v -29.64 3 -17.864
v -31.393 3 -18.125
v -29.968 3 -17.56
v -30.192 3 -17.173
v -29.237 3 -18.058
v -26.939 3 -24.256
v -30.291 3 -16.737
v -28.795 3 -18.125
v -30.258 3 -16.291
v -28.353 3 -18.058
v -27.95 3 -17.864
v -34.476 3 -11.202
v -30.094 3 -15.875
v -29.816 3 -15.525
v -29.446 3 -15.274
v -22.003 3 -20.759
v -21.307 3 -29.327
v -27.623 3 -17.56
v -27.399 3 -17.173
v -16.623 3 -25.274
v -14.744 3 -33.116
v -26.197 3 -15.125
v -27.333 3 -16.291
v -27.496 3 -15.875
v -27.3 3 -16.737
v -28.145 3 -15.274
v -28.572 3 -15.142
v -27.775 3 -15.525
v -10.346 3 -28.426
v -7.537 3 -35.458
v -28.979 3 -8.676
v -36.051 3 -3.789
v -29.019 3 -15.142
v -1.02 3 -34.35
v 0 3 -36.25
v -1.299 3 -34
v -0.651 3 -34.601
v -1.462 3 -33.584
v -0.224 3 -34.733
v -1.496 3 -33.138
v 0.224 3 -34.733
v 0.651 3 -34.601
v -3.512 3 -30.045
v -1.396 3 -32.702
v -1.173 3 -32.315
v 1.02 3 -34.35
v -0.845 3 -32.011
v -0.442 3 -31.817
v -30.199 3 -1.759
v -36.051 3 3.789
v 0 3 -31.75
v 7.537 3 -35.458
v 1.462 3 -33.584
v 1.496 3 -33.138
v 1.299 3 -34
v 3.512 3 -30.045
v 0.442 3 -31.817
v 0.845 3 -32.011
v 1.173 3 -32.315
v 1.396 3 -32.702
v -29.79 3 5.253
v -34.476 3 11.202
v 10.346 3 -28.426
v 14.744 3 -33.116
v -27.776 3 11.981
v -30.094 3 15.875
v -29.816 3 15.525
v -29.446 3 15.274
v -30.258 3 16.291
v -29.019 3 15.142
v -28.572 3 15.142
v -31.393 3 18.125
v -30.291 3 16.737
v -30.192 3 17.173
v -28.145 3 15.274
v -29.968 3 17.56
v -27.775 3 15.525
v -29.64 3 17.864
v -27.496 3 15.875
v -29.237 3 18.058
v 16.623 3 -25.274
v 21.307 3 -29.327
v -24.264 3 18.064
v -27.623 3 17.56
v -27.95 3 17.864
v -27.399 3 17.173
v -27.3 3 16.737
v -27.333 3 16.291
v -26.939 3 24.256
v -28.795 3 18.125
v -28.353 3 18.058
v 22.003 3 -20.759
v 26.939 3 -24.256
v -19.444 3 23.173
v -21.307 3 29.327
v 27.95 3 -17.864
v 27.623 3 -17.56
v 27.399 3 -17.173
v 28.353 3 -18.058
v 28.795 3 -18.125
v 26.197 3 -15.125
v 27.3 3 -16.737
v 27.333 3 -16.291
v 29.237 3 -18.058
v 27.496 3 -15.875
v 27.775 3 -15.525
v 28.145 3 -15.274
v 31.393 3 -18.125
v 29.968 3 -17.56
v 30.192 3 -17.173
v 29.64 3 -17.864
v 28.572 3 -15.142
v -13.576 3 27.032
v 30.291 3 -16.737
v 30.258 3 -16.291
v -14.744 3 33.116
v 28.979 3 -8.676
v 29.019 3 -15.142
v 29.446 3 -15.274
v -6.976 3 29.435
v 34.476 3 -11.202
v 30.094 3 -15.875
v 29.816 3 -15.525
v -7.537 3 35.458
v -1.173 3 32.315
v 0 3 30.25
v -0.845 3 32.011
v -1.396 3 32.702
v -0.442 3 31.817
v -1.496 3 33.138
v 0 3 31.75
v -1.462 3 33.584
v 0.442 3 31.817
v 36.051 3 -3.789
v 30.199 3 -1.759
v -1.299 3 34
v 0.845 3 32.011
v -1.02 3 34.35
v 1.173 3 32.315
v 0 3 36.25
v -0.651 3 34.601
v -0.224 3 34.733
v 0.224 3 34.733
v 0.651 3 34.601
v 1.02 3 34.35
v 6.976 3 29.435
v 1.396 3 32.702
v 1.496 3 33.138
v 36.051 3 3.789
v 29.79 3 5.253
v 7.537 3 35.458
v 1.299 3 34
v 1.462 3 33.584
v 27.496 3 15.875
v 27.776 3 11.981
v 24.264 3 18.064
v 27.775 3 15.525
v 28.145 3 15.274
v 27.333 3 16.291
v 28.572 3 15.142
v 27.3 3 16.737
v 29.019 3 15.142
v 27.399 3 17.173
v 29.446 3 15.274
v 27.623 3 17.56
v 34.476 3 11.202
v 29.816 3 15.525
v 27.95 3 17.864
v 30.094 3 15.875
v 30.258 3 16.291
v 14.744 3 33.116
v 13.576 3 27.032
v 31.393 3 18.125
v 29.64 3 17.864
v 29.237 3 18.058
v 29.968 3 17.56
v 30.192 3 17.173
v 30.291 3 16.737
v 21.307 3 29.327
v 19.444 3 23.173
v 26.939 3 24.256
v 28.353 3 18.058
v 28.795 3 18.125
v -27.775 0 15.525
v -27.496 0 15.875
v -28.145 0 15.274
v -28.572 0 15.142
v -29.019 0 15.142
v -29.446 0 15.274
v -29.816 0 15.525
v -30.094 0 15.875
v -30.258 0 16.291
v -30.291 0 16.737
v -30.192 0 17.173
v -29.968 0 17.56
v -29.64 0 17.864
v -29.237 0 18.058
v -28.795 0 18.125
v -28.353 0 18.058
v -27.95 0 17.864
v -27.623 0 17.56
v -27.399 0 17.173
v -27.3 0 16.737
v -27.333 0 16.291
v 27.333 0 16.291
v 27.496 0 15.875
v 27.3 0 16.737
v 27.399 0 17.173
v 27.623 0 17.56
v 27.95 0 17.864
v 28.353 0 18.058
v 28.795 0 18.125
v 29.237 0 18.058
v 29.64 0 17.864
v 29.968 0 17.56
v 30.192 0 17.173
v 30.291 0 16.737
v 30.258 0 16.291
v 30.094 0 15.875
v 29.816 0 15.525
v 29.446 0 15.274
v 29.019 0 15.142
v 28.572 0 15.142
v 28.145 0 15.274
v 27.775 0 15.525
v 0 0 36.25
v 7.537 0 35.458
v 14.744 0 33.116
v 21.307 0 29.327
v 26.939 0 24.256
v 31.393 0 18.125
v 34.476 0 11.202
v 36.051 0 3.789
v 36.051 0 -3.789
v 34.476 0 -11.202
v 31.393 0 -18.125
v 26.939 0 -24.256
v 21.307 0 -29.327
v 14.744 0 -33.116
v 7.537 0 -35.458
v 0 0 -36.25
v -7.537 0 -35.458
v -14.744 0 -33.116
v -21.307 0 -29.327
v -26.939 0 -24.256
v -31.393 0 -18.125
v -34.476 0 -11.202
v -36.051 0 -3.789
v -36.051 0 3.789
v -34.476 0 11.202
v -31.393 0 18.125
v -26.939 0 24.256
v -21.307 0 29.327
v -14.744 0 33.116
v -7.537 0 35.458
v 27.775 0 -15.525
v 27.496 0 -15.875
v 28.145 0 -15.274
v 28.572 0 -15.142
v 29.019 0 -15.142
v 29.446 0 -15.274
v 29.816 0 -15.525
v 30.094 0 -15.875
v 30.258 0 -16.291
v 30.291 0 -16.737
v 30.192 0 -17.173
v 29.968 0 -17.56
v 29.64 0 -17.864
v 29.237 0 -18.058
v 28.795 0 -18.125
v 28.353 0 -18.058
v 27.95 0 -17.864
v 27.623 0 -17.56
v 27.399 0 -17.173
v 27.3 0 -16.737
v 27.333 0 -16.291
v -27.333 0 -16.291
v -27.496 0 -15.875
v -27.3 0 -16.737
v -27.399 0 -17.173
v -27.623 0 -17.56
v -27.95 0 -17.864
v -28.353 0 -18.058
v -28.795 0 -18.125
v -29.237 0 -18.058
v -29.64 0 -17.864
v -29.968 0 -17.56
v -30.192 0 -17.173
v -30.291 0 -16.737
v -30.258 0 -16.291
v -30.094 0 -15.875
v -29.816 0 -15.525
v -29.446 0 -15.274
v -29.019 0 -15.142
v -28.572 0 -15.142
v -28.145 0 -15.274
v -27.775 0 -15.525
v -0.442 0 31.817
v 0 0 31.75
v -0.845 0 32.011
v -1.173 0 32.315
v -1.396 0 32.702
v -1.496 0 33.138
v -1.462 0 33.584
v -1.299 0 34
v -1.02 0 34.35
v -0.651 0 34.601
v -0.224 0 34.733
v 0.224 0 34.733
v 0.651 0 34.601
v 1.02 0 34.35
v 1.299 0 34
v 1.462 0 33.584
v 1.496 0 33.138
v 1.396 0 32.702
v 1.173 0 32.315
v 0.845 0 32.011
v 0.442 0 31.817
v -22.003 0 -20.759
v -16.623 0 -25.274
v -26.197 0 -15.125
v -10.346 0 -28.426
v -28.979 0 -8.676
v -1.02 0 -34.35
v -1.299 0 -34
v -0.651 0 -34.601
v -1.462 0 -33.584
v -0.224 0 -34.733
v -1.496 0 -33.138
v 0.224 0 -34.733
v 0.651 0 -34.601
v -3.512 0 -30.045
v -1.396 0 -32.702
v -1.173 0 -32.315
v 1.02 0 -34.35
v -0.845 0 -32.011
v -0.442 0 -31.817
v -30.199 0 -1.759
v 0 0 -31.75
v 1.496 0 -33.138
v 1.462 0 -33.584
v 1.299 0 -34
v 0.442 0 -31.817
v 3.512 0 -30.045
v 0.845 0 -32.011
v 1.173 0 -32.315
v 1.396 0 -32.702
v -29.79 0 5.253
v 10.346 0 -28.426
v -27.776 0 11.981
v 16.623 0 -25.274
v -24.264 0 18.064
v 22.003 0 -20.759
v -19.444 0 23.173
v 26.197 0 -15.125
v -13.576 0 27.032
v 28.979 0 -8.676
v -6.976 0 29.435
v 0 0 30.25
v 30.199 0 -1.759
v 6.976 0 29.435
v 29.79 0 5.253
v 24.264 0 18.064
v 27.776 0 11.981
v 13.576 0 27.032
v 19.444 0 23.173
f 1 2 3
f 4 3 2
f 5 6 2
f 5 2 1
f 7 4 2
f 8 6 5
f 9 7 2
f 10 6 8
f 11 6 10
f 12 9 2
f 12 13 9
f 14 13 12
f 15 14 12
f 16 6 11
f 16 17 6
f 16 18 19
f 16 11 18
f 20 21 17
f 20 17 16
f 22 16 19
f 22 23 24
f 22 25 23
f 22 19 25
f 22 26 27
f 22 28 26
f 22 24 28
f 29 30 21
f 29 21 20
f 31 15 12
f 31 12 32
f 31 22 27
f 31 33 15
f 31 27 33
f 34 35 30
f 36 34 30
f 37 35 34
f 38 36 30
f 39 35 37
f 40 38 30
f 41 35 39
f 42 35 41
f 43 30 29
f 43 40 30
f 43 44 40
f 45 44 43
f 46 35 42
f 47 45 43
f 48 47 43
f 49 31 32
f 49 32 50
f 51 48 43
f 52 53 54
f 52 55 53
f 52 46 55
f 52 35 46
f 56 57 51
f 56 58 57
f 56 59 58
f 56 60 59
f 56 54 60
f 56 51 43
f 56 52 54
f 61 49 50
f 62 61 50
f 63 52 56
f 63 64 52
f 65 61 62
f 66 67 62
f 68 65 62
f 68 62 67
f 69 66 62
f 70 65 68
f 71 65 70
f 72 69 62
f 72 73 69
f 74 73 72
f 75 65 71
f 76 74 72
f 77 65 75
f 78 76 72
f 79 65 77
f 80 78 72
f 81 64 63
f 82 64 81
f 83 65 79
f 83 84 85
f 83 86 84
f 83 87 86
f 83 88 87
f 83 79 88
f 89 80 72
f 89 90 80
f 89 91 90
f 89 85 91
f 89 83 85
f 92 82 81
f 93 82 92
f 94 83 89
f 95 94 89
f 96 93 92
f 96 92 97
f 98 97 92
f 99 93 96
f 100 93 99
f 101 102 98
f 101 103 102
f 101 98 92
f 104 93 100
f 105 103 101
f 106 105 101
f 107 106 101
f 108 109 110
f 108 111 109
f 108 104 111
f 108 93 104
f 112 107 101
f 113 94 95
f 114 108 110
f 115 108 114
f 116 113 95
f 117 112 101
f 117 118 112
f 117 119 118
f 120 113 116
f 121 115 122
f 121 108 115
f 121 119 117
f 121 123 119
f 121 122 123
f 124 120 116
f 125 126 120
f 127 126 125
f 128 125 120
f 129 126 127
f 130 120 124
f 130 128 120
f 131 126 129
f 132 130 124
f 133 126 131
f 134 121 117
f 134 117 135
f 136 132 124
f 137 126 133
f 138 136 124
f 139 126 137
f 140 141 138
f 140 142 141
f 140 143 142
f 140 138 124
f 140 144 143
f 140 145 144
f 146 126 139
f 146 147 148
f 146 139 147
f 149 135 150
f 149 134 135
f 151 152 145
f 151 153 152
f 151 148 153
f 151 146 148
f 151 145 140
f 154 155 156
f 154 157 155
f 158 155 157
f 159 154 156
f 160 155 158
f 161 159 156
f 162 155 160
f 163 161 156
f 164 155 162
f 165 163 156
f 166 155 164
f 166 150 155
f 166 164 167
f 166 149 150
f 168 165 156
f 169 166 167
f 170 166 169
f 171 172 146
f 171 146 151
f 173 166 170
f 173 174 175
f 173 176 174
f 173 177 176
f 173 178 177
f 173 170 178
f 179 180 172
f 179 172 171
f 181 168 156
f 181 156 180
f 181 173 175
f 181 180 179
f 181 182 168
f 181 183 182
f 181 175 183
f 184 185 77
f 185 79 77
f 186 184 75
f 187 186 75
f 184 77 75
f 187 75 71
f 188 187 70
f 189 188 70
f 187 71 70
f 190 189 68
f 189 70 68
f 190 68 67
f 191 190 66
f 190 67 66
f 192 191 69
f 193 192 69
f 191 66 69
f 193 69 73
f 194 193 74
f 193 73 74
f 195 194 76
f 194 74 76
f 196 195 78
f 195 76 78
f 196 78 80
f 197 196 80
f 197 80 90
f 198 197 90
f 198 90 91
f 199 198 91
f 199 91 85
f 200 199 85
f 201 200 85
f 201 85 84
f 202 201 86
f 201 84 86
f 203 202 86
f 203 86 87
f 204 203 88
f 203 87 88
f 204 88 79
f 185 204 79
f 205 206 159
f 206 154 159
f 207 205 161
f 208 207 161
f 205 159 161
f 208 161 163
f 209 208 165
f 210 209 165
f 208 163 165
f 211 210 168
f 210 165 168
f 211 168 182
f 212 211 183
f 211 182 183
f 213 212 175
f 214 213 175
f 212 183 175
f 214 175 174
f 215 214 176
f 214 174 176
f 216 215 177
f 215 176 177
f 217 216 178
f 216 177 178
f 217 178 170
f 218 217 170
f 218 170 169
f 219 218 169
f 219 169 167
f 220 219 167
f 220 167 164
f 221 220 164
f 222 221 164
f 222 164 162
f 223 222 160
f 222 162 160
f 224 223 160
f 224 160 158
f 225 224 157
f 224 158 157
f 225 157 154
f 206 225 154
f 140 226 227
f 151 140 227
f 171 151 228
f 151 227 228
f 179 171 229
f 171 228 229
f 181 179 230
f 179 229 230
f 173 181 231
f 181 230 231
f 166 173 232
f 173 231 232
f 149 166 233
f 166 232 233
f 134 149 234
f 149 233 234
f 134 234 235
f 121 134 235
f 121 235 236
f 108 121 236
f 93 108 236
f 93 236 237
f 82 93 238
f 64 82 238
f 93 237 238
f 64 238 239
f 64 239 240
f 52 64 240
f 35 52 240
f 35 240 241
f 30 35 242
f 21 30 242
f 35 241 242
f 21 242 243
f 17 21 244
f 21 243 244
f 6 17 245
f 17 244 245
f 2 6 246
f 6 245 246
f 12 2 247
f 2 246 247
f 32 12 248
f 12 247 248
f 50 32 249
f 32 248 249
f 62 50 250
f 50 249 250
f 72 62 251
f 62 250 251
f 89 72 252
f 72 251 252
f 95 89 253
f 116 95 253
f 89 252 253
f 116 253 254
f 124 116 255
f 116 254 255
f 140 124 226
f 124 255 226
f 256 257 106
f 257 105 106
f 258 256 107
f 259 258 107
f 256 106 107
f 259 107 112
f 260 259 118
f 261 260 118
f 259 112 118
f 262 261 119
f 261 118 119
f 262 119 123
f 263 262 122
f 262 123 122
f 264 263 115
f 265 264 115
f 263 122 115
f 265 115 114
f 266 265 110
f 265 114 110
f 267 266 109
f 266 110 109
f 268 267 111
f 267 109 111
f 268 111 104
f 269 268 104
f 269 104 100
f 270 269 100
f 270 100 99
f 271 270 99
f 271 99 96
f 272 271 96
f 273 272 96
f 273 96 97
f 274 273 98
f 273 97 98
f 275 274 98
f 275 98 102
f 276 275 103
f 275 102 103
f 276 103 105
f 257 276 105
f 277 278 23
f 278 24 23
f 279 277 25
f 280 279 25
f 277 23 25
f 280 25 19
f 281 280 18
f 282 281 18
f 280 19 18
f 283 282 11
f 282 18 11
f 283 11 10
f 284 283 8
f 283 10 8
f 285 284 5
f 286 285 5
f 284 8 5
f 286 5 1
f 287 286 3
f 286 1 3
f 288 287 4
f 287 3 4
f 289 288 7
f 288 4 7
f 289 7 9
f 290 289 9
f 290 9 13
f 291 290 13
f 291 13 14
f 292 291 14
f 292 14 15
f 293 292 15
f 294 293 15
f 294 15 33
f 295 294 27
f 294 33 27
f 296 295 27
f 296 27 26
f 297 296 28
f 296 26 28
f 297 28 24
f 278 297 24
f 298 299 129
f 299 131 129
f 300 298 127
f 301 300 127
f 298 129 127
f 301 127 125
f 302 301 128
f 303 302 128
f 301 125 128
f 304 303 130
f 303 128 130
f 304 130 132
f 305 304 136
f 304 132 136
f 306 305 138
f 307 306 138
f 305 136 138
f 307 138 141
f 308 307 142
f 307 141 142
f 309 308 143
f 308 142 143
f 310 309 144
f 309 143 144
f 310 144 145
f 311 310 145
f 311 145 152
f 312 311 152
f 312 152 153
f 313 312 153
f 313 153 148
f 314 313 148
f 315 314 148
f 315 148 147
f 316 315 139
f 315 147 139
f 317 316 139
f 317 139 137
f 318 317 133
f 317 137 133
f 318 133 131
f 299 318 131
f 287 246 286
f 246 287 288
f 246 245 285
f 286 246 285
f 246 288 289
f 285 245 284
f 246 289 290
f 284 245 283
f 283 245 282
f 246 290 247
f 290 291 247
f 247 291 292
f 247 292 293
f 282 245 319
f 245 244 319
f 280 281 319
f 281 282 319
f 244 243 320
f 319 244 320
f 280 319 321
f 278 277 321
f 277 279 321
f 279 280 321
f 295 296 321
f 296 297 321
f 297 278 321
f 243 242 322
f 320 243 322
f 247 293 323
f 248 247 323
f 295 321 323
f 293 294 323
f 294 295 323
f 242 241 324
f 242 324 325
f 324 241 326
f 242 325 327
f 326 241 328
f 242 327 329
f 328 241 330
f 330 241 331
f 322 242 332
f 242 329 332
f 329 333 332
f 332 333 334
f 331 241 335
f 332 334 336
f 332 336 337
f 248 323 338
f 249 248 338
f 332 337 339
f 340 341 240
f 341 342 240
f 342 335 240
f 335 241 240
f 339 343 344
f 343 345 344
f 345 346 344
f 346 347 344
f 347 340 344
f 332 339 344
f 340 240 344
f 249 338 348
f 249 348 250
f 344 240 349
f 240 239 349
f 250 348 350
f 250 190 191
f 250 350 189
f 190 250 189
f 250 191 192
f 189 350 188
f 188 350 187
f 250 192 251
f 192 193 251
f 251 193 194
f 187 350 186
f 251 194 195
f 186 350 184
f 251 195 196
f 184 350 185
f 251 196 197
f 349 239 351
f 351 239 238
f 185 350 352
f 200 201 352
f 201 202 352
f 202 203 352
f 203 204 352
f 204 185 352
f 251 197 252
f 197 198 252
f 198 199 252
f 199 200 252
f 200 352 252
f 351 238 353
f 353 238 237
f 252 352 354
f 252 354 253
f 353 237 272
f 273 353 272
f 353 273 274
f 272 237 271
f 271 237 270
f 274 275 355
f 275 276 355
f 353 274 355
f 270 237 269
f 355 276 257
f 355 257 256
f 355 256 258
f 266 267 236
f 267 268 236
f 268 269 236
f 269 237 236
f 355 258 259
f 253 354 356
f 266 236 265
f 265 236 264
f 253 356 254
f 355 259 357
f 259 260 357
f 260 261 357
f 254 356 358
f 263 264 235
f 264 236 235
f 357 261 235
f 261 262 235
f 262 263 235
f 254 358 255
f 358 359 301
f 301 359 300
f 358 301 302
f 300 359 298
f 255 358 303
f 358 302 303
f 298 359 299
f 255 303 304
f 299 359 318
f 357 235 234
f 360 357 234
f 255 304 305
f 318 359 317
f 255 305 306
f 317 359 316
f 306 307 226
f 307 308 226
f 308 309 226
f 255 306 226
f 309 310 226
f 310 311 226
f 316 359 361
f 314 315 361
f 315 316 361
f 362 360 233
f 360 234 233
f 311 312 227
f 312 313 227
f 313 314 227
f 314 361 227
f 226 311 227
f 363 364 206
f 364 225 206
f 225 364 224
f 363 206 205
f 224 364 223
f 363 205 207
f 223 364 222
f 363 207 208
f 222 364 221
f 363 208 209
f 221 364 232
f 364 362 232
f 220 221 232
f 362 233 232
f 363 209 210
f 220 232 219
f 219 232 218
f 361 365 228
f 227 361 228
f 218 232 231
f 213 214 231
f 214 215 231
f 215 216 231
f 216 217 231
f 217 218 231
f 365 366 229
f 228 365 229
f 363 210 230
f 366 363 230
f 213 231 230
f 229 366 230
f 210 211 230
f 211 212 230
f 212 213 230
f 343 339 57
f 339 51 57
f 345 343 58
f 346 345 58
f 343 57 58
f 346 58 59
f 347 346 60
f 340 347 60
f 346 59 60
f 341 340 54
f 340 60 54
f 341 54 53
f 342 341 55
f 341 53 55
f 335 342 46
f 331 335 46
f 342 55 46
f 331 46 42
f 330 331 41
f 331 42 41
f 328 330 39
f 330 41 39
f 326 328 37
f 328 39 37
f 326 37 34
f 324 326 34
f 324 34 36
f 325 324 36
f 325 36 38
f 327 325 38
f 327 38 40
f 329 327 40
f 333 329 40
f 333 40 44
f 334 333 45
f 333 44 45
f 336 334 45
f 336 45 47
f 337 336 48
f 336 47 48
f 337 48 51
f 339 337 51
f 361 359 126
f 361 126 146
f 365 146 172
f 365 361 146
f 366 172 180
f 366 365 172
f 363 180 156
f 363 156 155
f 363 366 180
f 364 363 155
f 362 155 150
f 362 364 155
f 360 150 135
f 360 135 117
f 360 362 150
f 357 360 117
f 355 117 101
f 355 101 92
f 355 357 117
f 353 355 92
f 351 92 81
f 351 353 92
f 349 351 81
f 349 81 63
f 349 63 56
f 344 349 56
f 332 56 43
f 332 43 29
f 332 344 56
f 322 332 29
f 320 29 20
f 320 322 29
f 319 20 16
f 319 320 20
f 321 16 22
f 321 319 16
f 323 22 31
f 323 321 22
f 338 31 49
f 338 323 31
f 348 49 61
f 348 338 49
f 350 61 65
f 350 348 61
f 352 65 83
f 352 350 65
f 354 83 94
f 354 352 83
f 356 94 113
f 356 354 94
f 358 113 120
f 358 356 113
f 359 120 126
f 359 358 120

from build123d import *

# Parameters (mm, degrees)
SKETCH1_R           = 36.25
SKETCH1_R_2         = 30.25
BOSS_EXTRUDE1_DEPTH = 3
SKETCH2_R           = 1.5
CUT_EXTRUDE1_DEPTH  = 52.352945388
CIRPATTERN1_COUNT   = 6


with BuildPart() as part:
    # Sketch1 → Boss-Extrude1 (new body)
    with BuildSketch(Plane(origin=(0, 0, 0), x_dir=(1, 0, 0), z_dir=(0, 1, 0))):
        with Locations(Location((0, 0, 0), (0, 0, 270))):
            Circle(SKETCH1_R)
        with Locations(Location((0, 0, 0), (0, 0, 270))):
            Circle(SKETCH1_R_2, mode=Mode.SUBTRACT)
    extrude(amount=BOSS_EXTRUDE1_DEPTH)

    # Sketch2 → Cut-Extrude1 (cut, symmetric)
    with BuildSketch(Plane(origin=(0, 3, 0), x_dir=(1, 0, 0), z_dir=(0, 1, 0))):
        with Locations(Location((0, 33.25, 0), (0, 0, 270))):
            Circle(SKETCH2_R)
    cut_extrude1 = extrude(amount=CUT_EXTRUDE1_DEPTH, both=True, mode=Mode.SUBTRACT)

    # CirPattern1: Cut-Extrude1 ×6 about axis
    cirpattern1_axis = Axis((0, 0, 0), (0, 1, 0))
    for i in range(1, CIRPATTERN1_COUNT):
        add(cut_extrude1.rotate(cirpattern1_axis, i * 360 / CIRPATTERN1_COUNT), mode=Mode.SUBTRACT)


solid = part.part
